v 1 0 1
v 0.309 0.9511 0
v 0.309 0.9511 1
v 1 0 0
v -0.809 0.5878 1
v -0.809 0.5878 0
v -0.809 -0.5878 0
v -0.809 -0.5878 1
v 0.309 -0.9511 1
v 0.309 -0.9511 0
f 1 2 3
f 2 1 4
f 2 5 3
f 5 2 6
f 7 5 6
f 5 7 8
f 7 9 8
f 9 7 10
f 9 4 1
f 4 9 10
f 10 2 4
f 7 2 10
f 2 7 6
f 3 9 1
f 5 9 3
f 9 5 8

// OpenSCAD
// file: ../../Meta/Resolution.scad
// Settings: Resolution 0 = low, 1 = high
RESOLUTION = 1;
function Resolution(low, high) = RESOLUTION == 0 ? low : high;
// main file
use <../../Meta/Resolution.scad>;

DEFAULT_PIVOT_X = 5;
DEFAULT_PIVOT_Z = -1;

module Pivot2(xyz=[0,0,0], angle=[0,0,0], factor=1) {
  translate([xyz[0],xyz[1],xyz[2]])
  rotate([angle[0]*factor,angle[1]*factor,angle[2]*factor])
  translate([-xyz[0],-xyz[1],-xyz[2]])
  children();
}

module Pivot(factor=1,
             angle=45,
             pivotX=DEFAULT_PIVOT_X,
             pivotZ=DEFAULT_PIVOT_Z,
             debug=false) {

  translate([pivotX,0,pivotZ])
  rotate([0,angle*factor,0])
  translate([-pivotX,0,-pivotZ]) {
    children();

    //if (debug)
    %translate([pivotX,0,pivotZ])
    rotate([90,0,0])
    %cylinder(r=0.1, h=5, center=true);
  }
}

module PivotHull(pivotX=DEFAULT_PIVOT_X, pivotZ=DEFAULT_PIVOT_Z,
                 angle=45, resolution=Resolution(0.25, 1)) {
  steps = angle * resolution;
  pivotStep = 1/(steps);

  render()
  union()
  for (i = [0:steps])
  hull() {
    if (i > 0)
    Pivot(pivotX=pivotX, pivotZ=pivotZ, angle=angle, factor=pivotStep*(i-1))
    children();

    Pivot(pivotX=pivotX, pivotZ=pivotZ, angle=angle, factor=pivotStep*i)
    children();
  }
}

Pivot(factor=$t)
cylinder();

%PivotHull()
cylinder();
